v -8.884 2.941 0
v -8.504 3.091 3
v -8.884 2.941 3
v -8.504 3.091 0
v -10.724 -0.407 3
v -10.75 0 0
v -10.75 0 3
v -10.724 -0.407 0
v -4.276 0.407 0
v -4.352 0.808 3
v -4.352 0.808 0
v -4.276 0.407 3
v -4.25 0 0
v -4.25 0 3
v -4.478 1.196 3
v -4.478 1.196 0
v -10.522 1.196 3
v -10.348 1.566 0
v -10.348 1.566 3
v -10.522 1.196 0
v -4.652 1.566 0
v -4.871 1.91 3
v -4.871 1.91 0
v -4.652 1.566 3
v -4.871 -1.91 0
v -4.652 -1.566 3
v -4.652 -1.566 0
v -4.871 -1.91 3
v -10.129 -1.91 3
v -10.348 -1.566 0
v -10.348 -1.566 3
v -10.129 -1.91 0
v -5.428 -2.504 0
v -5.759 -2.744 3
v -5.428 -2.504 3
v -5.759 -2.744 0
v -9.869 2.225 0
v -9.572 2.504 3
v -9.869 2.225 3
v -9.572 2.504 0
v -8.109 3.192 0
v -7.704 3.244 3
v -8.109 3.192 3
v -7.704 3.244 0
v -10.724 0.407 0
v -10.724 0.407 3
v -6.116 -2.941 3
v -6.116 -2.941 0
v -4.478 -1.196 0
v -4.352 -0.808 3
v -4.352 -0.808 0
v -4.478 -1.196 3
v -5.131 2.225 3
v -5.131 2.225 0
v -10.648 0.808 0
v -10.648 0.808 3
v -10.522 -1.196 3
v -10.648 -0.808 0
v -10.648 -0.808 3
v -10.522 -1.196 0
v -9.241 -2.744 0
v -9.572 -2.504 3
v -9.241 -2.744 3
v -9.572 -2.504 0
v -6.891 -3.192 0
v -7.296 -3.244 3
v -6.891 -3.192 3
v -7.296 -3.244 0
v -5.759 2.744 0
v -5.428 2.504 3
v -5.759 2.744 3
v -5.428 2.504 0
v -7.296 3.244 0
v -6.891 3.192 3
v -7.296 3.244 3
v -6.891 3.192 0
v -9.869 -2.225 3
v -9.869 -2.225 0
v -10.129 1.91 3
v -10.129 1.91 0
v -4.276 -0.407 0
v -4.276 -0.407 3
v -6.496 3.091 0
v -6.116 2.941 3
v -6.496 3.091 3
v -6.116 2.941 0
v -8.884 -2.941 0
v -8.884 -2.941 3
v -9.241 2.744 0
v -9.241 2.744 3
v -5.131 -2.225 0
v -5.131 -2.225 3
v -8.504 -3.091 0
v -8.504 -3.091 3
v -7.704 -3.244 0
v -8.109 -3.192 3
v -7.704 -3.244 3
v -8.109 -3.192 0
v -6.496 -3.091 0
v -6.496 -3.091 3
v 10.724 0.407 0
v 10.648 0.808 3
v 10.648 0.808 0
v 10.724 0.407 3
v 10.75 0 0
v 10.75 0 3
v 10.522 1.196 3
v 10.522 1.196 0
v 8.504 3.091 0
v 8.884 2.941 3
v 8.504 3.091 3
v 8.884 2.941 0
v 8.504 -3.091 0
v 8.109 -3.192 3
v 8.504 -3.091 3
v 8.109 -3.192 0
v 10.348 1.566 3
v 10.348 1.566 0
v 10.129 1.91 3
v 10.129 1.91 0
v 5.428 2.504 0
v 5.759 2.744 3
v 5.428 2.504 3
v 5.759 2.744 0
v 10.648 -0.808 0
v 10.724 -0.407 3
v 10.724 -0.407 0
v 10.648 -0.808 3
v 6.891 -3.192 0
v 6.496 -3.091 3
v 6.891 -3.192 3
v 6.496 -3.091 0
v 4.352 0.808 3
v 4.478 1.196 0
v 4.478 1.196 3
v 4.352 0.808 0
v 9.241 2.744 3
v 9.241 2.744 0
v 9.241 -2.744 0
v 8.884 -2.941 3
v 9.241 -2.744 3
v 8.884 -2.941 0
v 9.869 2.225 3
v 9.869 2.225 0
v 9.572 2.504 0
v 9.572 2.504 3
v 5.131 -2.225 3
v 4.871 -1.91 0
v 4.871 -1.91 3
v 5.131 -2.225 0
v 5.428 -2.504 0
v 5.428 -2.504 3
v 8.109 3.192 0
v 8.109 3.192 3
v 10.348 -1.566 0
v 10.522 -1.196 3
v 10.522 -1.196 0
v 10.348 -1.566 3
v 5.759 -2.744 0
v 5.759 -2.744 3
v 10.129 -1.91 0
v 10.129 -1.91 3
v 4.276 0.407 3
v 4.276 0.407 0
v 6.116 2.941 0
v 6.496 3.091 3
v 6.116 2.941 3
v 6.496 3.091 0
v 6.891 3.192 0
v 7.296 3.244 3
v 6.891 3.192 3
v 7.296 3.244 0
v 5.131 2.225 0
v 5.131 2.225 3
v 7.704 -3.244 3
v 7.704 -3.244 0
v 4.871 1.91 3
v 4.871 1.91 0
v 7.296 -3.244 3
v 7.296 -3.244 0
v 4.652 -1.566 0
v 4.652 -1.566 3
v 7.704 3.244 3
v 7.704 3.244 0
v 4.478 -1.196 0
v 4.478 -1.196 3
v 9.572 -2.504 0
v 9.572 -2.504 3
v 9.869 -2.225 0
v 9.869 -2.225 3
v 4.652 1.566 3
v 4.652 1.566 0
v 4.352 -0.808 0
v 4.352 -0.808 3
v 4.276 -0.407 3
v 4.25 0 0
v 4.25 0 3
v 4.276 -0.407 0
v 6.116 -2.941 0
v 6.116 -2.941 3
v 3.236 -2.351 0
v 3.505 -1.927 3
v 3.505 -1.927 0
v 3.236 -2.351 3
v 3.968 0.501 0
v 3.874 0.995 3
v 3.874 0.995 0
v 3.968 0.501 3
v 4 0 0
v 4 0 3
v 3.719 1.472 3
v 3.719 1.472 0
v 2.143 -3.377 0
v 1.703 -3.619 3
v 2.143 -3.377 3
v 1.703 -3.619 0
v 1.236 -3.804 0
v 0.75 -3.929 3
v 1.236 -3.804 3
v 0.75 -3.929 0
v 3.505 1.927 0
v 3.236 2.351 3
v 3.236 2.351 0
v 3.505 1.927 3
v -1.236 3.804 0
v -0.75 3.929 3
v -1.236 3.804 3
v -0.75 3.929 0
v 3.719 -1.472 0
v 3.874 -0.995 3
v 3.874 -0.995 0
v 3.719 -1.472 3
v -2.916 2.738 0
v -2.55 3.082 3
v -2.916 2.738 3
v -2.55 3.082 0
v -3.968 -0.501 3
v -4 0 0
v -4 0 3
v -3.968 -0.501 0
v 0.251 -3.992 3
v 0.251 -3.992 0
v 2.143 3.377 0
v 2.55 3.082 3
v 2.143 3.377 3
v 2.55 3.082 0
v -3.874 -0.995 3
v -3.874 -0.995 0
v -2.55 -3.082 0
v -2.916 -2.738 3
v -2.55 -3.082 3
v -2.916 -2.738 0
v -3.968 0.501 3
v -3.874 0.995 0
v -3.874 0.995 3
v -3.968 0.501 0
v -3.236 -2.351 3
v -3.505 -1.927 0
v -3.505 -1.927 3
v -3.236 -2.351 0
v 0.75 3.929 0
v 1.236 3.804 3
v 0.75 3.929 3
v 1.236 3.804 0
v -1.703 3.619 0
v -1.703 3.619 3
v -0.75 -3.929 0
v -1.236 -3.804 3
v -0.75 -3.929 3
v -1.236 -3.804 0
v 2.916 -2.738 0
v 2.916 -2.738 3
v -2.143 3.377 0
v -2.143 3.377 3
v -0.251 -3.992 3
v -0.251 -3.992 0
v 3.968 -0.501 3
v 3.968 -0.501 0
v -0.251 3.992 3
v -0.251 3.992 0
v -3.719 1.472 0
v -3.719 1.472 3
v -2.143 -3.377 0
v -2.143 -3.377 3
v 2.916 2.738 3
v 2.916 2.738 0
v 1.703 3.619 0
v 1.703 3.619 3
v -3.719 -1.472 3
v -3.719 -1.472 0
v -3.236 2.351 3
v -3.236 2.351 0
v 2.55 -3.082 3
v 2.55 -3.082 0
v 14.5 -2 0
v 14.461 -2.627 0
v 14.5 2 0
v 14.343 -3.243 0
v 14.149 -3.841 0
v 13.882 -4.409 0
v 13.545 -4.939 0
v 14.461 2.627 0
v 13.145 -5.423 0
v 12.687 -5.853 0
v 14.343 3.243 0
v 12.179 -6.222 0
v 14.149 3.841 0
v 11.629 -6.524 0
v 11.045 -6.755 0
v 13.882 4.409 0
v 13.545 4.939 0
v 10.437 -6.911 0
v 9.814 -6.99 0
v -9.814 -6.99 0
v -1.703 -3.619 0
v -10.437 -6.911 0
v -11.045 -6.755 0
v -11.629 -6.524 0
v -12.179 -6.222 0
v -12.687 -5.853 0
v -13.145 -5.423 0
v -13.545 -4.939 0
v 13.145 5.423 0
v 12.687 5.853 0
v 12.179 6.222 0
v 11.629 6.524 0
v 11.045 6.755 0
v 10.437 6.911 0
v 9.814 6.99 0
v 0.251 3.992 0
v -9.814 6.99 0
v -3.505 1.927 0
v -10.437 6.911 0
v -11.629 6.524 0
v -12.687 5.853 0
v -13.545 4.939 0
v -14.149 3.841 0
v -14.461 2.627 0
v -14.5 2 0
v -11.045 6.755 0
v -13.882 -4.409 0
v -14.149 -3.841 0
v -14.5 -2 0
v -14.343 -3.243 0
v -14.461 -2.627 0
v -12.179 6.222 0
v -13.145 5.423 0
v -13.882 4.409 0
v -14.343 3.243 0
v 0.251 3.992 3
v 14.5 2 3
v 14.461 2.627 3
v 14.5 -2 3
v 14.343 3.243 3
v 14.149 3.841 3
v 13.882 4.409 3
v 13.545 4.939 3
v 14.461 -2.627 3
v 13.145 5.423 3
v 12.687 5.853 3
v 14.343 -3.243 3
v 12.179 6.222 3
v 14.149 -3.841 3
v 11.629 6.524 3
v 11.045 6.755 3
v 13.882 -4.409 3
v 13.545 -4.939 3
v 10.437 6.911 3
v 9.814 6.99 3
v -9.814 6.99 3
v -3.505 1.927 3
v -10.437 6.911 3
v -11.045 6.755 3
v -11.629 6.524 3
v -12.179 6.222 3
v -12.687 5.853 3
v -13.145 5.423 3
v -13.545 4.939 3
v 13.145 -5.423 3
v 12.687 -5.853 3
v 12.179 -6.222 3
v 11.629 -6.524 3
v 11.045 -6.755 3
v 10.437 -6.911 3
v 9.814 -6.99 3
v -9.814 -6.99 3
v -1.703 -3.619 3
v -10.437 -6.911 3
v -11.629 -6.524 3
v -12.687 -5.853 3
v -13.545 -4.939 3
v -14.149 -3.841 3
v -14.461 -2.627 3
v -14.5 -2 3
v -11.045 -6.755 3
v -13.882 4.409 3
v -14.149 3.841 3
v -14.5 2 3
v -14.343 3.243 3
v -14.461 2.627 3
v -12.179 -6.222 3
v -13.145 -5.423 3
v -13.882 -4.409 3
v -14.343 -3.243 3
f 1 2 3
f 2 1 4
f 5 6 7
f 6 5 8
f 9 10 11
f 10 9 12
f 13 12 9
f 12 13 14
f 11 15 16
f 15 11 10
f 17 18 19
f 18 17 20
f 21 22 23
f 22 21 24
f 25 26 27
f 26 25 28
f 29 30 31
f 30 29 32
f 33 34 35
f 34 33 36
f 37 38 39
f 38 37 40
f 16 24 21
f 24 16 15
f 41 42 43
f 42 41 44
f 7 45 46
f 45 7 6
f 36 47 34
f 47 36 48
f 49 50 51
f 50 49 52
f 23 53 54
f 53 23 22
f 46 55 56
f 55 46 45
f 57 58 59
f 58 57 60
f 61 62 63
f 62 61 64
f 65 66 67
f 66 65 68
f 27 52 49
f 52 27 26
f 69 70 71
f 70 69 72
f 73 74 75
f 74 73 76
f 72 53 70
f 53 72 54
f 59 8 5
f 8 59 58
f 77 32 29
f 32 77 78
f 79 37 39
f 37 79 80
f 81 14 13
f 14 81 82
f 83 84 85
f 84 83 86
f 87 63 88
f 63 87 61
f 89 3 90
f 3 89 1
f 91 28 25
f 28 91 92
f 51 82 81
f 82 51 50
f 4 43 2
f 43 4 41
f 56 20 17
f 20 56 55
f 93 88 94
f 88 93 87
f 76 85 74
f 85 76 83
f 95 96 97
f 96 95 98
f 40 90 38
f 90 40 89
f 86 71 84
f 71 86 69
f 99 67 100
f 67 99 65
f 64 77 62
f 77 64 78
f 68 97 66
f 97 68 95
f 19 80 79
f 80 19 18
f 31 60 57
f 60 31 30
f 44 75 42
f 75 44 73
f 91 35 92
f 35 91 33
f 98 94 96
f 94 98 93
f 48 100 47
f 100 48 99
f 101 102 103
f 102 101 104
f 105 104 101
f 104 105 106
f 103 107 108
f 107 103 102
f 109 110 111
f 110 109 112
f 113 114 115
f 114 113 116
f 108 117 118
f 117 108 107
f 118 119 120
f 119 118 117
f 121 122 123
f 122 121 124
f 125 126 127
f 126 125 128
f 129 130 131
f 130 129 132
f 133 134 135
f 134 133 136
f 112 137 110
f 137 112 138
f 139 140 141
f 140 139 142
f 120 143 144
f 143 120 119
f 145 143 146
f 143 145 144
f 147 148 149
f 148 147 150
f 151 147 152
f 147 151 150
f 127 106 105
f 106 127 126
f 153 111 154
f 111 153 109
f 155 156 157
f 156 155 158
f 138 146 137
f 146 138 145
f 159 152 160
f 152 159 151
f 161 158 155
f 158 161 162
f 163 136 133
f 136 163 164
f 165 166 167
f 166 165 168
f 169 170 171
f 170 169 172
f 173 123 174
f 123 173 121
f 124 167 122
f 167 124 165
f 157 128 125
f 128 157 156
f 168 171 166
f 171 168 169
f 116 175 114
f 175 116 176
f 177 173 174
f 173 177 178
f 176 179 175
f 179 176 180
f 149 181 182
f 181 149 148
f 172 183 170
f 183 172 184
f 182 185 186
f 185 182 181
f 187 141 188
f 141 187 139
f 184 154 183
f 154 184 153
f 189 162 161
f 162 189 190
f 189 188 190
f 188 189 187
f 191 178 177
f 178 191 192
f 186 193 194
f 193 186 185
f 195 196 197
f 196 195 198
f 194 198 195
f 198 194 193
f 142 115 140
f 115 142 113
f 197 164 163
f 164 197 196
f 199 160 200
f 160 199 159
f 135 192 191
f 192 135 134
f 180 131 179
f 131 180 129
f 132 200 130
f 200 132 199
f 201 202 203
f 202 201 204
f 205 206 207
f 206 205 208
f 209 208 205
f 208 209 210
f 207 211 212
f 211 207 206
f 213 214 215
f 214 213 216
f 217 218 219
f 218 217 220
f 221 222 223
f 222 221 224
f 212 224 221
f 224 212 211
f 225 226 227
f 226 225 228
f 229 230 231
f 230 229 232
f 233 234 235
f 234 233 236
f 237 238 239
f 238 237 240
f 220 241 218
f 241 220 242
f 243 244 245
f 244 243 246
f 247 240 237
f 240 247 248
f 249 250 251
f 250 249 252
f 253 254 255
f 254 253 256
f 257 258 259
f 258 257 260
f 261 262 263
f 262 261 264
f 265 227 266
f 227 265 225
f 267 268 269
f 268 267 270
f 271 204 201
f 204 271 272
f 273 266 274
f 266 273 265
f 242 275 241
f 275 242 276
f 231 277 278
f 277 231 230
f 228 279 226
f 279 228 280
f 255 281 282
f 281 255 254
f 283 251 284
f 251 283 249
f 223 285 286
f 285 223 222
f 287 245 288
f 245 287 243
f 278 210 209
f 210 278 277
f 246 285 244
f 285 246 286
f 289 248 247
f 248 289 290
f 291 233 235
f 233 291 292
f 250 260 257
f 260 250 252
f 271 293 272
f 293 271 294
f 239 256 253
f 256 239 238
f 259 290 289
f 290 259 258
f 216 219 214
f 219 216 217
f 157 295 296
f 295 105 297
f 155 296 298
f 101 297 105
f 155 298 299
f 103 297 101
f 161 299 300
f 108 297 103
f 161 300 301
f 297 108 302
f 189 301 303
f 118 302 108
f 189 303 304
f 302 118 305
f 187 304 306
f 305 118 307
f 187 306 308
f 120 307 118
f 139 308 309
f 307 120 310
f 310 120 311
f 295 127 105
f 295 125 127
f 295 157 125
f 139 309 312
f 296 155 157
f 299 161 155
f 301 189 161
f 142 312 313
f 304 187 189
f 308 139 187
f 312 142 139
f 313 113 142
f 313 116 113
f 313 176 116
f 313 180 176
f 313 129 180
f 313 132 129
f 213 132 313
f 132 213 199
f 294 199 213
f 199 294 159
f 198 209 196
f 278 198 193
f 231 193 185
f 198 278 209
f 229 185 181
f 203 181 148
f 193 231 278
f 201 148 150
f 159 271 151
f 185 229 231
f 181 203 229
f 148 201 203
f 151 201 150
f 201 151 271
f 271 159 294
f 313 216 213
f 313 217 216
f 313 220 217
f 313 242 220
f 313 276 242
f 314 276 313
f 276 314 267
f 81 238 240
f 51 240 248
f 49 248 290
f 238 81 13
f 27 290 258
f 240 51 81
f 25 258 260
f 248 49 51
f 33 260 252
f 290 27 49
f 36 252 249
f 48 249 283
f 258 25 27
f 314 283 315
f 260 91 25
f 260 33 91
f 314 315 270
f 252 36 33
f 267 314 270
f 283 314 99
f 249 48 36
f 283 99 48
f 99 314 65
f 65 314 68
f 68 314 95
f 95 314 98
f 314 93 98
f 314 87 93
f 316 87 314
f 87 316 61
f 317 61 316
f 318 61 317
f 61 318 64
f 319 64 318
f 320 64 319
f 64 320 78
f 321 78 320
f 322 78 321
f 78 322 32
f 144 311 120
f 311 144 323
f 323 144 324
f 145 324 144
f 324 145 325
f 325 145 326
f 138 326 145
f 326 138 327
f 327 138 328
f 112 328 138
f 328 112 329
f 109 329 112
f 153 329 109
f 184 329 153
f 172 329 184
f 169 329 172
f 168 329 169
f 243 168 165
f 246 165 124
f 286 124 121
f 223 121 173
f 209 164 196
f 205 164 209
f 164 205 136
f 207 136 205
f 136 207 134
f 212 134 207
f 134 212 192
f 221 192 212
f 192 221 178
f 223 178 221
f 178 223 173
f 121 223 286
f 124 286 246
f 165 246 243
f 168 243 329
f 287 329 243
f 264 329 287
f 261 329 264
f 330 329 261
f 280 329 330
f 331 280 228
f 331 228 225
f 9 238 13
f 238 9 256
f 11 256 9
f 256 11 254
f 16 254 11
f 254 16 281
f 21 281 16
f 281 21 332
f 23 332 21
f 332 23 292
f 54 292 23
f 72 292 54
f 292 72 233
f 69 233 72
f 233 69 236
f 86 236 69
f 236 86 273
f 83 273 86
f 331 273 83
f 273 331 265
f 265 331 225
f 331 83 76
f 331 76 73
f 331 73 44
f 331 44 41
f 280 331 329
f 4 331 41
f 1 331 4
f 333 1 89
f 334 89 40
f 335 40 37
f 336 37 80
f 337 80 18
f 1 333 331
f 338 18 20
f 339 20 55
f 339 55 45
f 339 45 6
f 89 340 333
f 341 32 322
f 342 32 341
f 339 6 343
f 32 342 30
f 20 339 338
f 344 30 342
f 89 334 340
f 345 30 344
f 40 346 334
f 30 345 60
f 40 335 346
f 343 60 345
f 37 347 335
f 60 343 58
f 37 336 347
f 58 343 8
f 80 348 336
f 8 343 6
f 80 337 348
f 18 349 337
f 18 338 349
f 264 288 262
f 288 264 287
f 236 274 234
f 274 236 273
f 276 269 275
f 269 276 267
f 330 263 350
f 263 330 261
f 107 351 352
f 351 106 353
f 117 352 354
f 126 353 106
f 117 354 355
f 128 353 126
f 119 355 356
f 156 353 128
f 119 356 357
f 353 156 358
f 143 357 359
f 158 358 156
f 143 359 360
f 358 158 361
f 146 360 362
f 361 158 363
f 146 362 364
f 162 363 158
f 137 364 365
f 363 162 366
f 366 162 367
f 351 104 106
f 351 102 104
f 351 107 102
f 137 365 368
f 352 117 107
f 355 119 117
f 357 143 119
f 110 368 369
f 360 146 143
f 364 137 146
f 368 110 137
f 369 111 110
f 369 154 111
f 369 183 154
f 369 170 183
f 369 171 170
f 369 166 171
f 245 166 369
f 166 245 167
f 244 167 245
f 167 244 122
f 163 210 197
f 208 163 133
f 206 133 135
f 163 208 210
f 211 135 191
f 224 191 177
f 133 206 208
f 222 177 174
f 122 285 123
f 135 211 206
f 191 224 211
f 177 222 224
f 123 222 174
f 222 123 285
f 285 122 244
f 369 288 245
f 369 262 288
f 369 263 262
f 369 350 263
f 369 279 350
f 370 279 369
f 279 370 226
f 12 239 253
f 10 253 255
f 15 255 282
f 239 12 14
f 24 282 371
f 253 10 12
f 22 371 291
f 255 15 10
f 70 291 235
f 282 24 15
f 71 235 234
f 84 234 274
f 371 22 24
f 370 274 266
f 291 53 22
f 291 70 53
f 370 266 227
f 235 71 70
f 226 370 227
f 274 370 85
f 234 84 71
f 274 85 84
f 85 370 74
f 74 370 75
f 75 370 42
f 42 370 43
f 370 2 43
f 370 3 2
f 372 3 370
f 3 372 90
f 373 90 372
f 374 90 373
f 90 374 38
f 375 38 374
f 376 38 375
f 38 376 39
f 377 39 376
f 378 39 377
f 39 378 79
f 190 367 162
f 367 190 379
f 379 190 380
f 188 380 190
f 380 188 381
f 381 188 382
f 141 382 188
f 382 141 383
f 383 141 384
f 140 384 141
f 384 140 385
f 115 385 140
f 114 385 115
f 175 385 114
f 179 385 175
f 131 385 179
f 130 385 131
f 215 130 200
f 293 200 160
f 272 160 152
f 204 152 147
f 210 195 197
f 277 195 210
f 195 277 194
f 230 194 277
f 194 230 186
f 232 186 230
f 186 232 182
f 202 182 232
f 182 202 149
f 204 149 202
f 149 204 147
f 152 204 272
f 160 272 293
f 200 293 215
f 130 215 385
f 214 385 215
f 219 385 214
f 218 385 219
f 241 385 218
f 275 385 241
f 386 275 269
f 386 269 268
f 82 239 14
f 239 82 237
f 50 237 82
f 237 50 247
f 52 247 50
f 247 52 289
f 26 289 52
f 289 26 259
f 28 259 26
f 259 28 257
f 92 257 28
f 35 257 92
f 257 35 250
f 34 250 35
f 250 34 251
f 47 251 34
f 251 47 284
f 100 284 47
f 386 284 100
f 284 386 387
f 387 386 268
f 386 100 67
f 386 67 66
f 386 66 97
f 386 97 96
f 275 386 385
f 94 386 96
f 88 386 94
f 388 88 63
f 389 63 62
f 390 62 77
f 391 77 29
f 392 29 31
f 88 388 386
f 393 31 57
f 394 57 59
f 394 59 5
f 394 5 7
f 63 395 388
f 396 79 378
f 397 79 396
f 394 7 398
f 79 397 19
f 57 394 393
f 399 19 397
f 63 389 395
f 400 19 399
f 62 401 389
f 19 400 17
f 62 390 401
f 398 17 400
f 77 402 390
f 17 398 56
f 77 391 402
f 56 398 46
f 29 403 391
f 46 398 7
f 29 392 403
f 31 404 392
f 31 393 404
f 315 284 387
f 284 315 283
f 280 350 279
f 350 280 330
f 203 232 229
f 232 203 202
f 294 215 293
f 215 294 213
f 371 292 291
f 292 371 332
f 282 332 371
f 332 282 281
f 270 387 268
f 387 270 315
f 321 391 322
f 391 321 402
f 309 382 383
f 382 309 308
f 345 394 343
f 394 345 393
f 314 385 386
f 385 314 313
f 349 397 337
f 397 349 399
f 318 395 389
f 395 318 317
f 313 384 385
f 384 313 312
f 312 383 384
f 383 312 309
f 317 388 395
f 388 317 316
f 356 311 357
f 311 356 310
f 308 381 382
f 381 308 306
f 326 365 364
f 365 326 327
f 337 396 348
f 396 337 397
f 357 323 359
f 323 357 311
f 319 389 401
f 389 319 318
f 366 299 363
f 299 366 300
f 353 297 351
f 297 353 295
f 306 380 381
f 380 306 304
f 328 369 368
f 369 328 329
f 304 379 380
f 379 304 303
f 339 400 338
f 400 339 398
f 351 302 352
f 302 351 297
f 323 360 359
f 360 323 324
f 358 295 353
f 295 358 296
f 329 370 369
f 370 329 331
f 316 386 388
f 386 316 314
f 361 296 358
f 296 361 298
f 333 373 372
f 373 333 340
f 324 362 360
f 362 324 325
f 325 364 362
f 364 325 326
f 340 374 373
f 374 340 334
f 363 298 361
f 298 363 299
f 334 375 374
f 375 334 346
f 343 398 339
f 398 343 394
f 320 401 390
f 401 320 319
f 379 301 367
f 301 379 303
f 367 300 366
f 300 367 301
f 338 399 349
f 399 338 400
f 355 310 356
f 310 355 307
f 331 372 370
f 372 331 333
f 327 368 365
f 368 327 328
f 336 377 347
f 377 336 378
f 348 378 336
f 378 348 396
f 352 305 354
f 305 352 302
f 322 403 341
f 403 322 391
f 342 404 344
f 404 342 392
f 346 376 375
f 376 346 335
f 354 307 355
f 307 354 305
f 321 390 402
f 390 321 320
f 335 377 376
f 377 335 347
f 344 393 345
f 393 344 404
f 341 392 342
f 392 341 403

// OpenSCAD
$fn = 50;


difference() {
	union() {
		hull() {
			translate(v = [-9.5000000000, 2.0000000000, 0]) {
				cylinder(h = 3, r = 5);
			}
			translate(v = [9.5000000000, 2.0000000000, 0]) {
				cylinder(h = 3, r = 5);
			}
			translate(v = [-9.5000000000, -2.0000000000, 0]) {
				cylinder(h = 3, r = 5);
			}
			translate(v = [9.5000000000, -2.0000000000, 0]) {
				cylinder(h = 3, r = 5);
			}
		}
	}
	union() {
		#translate(v = [-7.5000000000, 0.0000000000, -100.0000000000]) {
			cylinder(h = 200, r = 3.2500000000);
		}
		#translate(v = [-7.5000000000, 0.0000000000, -100.0000000000]) {
			cylinder(h = 200, r = 3.2500000000);
		}
		#translate(v = [7.5000000000, 0.0000000000, -100.0000000000]) {
			cylinder(h = 200, r = 3.2500000000);
		}
		#translate(v = [7.5000000000, 0.0000000000, -100.0000000000]) {
			cylinder(h = 200, r = 3.2500000000);
		}
		#cylinder(h = 3, r = 4.0000000000);
	}
}
